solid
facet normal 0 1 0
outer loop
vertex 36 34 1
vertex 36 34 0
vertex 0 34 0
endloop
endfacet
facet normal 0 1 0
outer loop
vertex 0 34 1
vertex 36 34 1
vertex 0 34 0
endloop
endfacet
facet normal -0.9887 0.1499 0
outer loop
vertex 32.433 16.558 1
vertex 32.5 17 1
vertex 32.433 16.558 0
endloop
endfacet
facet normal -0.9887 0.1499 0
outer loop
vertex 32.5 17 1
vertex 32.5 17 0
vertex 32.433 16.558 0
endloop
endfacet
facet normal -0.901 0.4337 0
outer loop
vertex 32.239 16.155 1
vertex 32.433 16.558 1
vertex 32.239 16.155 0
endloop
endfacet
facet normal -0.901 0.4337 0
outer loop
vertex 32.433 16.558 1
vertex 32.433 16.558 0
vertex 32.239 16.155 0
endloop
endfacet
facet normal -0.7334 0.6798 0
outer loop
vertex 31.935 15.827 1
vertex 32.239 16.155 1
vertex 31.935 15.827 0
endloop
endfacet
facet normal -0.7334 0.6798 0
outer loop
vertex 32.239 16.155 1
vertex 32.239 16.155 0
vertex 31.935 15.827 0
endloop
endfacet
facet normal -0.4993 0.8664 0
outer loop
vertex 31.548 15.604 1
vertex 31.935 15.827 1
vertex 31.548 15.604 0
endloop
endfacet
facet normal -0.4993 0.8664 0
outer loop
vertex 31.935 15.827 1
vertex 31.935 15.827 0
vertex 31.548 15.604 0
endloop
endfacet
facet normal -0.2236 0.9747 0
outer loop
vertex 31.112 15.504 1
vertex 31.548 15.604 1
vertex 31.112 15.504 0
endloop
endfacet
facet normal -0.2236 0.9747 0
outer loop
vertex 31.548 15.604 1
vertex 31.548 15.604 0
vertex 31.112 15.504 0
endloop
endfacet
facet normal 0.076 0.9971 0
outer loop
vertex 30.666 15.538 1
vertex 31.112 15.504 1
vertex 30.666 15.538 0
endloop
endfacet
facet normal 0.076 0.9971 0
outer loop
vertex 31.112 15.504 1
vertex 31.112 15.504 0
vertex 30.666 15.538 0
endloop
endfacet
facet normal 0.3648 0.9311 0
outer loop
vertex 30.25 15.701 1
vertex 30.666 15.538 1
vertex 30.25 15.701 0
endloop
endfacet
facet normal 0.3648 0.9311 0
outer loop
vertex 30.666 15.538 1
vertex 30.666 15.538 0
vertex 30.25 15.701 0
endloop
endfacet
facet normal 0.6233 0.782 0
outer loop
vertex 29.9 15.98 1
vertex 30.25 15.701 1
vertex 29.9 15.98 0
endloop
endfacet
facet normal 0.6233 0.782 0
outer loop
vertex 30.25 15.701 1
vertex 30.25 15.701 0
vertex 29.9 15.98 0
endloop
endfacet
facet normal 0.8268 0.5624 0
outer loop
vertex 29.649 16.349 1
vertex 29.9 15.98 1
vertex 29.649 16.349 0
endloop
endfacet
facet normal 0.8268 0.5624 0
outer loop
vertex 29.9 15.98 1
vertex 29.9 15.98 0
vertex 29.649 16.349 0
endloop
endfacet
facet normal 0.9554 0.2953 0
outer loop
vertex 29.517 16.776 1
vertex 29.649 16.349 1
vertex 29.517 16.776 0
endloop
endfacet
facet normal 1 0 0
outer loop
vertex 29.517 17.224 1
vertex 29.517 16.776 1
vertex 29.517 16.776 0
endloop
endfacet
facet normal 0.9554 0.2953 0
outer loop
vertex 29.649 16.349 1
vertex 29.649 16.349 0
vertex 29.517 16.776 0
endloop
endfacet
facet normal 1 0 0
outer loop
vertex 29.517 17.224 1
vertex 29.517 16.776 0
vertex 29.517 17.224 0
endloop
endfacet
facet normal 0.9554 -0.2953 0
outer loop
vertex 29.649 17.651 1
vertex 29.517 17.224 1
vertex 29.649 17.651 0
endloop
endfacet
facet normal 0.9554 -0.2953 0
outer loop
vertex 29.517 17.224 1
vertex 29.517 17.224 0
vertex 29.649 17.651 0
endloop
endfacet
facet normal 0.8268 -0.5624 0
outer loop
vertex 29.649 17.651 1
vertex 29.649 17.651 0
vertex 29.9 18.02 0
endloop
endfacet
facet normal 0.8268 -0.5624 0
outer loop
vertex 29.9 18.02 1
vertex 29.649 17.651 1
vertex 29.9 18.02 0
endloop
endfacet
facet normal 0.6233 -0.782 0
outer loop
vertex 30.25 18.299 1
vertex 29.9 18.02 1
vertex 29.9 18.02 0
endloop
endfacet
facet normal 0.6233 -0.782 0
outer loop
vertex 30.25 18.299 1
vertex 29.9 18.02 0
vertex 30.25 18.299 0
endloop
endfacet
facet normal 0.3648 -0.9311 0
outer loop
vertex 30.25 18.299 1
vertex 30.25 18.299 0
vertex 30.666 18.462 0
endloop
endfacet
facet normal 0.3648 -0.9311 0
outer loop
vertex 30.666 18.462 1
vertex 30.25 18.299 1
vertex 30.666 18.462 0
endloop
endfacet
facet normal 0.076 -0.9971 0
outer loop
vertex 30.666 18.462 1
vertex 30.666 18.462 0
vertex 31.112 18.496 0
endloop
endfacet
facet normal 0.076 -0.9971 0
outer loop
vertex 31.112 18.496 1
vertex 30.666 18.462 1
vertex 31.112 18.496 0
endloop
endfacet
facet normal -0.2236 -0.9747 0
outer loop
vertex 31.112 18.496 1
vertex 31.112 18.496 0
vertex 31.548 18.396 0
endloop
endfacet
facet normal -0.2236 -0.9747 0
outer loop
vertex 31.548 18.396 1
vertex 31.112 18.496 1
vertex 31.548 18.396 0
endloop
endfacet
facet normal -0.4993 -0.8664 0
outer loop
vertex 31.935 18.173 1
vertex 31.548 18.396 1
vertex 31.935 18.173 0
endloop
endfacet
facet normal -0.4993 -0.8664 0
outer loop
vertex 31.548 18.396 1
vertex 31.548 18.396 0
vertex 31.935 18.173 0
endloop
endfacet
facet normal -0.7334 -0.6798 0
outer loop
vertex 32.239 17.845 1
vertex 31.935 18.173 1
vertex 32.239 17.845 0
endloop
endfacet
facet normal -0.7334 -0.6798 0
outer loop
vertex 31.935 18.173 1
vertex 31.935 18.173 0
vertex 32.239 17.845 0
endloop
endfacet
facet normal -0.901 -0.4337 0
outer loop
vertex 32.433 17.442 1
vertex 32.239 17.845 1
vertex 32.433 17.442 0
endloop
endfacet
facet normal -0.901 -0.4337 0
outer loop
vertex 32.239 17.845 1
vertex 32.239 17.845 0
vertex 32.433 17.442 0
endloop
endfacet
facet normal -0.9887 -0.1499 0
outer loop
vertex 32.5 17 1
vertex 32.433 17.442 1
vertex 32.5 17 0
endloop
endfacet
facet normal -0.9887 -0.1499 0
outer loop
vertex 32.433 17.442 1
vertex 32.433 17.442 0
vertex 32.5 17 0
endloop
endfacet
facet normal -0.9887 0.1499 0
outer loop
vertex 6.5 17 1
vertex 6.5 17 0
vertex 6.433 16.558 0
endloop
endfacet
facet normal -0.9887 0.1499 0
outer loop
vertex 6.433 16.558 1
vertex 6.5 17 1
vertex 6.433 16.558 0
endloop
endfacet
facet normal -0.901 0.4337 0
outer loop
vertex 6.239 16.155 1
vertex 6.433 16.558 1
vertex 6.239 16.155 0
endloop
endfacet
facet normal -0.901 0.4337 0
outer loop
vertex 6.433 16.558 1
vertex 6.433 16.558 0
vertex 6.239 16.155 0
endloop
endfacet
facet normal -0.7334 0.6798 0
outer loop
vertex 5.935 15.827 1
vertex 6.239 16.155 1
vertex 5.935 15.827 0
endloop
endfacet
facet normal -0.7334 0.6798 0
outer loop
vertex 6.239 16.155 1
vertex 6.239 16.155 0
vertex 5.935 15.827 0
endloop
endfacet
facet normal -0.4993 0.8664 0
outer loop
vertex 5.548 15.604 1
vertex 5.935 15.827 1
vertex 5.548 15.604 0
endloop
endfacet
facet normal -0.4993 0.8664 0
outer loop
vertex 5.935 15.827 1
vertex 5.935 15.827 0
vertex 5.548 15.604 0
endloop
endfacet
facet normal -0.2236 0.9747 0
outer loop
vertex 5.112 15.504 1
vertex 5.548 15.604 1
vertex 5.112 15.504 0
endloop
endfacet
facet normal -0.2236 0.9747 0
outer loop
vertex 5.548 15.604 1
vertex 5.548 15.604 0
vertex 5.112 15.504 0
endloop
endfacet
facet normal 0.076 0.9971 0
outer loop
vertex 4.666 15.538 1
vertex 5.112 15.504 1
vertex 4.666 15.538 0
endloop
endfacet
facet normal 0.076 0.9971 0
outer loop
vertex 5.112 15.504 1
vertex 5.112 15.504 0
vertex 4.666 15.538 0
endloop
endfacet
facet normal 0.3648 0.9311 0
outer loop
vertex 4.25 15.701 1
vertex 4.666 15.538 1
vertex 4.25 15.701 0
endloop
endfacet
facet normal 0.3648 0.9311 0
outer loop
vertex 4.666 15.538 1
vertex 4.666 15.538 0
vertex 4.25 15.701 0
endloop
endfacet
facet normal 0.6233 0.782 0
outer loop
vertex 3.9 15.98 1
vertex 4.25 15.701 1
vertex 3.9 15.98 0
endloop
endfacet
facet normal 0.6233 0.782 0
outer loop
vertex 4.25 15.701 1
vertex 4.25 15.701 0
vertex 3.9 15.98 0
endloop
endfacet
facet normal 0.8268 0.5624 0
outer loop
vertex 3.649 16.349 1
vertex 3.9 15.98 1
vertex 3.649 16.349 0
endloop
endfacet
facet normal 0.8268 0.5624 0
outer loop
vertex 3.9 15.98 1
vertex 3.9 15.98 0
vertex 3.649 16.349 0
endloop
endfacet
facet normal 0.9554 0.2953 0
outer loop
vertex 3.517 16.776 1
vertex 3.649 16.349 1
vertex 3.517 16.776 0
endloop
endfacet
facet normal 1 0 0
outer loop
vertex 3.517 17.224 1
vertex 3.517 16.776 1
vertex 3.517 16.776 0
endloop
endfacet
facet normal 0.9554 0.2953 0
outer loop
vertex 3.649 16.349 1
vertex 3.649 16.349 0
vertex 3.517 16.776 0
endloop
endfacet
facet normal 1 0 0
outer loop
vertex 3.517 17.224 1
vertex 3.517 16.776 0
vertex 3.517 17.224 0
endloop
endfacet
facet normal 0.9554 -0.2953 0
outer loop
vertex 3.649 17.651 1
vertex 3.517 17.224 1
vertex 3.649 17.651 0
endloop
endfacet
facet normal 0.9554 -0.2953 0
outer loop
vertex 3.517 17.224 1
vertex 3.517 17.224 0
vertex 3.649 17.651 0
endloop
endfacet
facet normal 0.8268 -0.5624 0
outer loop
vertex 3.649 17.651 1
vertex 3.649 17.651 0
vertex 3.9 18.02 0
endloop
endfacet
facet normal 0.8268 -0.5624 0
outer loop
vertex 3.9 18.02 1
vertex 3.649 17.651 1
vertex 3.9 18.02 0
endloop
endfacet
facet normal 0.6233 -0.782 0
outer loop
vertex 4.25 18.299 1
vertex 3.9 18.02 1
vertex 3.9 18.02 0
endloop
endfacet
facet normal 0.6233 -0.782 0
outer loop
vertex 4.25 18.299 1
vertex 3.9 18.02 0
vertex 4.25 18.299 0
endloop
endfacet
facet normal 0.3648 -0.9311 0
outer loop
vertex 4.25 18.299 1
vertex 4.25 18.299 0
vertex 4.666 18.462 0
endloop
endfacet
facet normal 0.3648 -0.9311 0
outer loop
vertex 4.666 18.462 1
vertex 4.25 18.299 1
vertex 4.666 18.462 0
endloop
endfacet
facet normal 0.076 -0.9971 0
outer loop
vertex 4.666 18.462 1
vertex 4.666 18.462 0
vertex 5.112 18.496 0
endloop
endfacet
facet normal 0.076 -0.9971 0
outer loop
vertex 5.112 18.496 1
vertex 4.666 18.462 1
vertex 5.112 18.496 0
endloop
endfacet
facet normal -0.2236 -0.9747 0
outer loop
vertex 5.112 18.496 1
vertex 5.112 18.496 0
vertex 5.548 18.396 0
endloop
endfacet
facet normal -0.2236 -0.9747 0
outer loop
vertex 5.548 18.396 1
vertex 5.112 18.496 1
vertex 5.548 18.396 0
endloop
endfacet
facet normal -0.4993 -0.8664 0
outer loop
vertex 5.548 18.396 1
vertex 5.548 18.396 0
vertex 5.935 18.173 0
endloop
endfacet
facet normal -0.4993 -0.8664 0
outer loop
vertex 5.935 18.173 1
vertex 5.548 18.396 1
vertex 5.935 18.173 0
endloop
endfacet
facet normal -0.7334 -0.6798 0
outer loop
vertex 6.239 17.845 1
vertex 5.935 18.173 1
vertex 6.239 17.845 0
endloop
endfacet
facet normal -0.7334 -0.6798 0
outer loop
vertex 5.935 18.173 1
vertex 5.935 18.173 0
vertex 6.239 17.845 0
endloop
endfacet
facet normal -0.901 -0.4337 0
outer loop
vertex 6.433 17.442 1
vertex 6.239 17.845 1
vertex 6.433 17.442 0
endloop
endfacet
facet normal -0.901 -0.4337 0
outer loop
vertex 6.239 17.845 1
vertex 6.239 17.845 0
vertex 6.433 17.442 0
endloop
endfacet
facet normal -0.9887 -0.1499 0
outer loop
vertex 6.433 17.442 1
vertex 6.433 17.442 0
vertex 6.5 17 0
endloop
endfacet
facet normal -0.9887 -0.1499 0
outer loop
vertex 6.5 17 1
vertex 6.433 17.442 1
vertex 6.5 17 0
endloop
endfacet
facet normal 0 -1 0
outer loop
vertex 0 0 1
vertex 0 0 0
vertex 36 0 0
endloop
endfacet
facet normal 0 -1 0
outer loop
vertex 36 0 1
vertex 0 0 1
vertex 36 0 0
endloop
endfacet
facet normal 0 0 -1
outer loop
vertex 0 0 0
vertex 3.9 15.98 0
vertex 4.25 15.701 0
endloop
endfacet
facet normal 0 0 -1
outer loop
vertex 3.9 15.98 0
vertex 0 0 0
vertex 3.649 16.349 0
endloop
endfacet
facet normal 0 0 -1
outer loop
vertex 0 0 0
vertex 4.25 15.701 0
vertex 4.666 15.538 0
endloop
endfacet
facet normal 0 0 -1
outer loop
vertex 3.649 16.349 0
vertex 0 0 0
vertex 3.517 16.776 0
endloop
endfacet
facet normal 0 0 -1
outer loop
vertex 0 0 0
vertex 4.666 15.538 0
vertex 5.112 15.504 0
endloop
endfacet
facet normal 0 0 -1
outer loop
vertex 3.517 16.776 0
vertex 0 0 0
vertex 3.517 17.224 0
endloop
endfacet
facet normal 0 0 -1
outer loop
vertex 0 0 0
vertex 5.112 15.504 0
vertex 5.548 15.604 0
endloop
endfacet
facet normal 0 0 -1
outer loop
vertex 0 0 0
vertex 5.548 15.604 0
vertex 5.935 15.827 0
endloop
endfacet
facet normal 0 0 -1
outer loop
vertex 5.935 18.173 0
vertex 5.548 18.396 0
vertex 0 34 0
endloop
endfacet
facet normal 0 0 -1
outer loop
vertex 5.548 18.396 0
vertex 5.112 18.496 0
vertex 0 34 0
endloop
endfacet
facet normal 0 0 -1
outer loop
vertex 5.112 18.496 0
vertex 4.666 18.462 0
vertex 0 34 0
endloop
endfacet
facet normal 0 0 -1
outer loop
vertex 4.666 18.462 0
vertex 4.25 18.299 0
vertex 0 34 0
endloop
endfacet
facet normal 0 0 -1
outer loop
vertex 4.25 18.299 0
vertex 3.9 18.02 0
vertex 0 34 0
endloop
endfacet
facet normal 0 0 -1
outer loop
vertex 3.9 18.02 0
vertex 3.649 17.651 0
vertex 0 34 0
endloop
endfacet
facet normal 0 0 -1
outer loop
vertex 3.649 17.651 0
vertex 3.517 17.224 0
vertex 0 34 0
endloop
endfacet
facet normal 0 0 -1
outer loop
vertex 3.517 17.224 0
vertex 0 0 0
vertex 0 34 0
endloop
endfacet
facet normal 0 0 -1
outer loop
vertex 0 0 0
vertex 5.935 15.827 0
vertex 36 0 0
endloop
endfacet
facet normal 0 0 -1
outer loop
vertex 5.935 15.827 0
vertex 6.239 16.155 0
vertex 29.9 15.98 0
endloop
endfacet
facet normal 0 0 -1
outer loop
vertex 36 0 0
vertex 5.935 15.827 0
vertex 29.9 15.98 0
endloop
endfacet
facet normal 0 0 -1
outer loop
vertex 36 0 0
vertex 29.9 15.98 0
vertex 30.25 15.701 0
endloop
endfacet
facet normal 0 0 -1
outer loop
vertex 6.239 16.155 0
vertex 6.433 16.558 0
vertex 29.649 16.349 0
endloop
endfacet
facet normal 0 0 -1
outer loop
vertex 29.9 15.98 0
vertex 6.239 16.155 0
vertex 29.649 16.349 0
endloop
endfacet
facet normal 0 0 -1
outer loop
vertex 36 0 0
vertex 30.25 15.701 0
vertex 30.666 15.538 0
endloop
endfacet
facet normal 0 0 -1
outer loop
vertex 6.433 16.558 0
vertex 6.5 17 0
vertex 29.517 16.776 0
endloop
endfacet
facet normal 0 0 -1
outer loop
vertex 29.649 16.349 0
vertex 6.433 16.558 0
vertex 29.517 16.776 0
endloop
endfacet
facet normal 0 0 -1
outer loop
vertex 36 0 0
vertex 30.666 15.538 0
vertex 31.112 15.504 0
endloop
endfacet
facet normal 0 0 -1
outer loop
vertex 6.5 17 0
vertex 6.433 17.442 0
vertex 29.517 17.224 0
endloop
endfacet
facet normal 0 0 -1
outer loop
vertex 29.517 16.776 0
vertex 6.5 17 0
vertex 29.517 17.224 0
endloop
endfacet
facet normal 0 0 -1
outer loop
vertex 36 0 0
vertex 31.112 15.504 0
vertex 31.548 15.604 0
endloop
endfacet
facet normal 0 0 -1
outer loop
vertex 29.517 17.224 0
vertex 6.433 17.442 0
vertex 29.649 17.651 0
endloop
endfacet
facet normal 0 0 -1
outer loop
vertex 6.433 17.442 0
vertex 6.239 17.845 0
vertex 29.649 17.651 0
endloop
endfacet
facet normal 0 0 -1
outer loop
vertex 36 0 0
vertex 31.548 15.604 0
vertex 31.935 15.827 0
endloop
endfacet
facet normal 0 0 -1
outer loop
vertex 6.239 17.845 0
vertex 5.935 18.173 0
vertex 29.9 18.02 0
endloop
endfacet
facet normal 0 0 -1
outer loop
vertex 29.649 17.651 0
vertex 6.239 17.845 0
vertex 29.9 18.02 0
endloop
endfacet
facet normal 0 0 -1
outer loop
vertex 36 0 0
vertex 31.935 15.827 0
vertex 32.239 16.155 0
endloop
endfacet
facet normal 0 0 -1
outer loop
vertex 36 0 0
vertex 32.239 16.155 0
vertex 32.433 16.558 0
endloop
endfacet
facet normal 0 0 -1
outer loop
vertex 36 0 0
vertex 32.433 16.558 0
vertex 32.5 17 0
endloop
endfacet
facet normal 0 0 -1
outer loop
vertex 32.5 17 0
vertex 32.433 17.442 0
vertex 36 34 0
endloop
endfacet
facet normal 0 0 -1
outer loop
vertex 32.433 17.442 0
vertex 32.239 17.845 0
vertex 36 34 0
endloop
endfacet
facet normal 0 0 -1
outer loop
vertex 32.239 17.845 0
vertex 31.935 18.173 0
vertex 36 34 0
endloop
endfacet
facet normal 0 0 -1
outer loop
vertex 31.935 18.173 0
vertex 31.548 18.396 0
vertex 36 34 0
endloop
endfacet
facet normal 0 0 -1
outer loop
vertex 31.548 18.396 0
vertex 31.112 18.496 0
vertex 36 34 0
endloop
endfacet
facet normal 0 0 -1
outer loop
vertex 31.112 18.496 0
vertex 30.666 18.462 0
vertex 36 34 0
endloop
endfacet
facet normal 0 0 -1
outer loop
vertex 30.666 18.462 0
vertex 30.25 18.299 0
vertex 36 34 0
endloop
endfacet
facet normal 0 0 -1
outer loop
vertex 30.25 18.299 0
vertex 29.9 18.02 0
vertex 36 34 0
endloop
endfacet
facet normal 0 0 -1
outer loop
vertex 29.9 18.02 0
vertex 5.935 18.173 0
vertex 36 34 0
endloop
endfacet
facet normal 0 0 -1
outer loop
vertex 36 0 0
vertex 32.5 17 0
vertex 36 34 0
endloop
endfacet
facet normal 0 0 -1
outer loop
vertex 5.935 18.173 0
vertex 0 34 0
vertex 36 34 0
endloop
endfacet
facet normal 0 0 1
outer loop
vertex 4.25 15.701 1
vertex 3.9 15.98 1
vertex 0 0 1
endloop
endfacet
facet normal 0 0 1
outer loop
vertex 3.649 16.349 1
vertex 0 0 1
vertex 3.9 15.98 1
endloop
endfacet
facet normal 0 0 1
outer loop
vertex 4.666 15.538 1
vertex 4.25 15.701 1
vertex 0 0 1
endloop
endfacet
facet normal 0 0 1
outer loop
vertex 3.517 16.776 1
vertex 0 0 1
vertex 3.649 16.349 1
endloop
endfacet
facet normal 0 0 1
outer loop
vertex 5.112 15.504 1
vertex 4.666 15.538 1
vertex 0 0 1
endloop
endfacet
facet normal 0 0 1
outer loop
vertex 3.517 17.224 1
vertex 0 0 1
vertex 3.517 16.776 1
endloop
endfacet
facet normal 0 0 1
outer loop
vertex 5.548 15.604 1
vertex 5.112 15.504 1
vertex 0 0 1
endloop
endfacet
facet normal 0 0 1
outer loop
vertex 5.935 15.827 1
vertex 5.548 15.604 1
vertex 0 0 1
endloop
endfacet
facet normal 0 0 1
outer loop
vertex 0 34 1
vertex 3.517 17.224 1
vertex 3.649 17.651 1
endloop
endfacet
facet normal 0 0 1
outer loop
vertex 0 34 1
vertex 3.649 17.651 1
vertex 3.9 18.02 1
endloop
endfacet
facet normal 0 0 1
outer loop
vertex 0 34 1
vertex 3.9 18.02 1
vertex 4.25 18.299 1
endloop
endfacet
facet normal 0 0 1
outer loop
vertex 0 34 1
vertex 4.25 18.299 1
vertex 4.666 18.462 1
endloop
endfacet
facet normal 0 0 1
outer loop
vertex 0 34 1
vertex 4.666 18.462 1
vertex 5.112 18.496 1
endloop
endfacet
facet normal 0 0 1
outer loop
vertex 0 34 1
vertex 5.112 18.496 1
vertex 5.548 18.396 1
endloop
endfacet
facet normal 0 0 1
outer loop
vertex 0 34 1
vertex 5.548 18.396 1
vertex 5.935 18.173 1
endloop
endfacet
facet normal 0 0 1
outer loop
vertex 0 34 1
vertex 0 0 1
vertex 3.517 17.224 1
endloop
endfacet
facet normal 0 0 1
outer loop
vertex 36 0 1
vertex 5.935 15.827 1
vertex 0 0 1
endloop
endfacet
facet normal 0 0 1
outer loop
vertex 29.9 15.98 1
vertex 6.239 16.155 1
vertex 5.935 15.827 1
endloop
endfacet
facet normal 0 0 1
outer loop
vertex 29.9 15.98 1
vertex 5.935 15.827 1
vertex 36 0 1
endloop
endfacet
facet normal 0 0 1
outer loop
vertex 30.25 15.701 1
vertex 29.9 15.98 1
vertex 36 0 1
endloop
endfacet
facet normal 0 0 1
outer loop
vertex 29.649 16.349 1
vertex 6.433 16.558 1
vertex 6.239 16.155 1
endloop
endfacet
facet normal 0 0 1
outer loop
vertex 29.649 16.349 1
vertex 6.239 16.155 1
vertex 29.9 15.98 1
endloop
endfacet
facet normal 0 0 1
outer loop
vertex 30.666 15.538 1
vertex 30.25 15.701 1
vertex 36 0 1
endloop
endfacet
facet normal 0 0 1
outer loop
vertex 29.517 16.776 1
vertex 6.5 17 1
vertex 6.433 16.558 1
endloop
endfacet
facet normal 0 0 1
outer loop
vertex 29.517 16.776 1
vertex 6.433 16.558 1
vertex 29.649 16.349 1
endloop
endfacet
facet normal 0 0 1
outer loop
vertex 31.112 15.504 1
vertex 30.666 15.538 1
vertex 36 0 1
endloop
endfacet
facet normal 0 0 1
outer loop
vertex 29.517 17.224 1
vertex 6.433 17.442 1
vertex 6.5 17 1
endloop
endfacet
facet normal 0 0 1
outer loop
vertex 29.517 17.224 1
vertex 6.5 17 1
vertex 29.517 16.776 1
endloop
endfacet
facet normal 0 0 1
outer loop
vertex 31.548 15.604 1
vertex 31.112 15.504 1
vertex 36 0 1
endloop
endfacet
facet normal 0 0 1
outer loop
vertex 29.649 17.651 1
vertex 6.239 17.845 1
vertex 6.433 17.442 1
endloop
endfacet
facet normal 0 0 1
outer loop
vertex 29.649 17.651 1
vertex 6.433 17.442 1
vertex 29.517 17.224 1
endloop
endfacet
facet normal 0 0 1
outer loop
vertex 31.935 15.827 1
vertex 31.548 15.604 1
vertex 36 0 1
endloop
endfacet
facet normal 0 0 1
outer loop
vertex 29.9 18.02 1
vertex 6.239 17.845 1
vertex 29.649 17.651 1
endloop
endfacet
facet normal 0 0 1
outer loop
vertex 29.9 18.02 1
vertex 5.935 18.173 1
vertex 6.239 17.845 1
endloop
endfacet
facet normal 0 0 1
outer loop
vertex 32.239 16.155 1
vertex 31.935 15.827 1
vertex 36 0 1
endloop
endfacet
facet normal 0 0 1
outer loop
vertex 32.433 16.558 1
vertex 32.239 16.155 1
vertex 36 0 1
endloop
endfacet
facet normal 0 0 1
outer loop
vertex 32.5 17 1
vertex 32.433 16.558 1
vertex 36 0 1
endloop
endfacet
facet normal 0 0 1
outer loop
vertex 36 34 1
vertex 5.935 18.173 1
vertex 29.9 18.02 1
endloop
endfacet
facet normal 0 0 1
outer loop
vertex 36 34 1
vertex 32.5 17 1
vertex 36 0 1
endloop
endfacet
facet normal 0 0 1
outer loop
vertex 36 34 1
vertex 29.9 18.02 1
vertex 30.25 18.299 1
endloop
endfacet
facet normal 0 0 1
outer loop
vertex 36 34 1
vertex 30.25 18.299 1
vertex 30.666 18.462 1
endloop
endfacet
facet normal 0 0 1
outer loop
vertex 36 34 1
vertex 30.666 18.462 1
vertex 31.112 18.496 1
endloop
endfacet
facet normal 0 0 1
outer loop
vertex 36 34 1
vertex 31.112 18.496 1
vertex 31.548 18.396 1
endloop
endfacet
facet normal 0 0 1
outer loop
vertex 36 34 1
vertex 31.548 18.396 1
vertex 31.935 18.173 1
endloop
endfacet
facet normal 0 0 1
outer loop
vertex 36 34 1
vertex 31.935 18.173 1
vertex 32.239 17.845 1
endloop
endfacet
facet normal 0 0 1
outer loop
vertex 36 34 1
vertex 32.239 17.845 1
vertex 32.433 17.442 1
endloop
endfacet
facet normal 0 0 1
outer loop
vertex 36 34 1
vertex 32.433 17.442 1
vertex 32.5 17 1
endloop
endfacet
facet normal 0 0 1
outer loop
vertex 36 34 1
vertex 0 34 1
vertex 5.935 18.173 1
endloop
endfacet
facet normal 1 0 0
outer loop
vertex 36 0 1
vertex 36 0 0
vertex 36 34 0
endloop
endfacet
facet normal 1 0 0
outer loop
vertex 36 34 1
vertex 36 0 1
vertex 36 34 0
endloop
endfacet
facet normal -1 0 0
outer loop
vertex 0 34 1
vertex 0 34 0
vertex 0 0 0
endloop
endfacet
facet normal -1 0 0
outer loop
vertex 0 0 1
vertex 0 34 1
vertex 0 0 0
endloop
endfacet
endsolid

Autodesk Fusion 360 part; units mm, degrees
sketch "スケッチ1" plane through (0, 0, 0) normal (0, 0, 1) x (1, 0, 0)
  line L0 (0, 0) -> (36, 0)
  line L1 (36, 0) -> (36, 34)
  line L2 (36, 34) -> (0, 34)
  line L3 (0, 34) -> (0, 0)
  line L4 (0, 34) -> (0, 17)
  line L5 (0, 17) -> (5, 17)
  circle A0 centre (5, 17) radius 1.5
  line L6 (5, 17) -> (31, 17)
  circle A1 centre (31, 17) radius 1.5
  line L7 (31, 17) -> (36, 17)
  dimension "d1" = 36
  dimension "d2" = 34
  dimension "d3" = 3
  dimension "d4" = 26
  dimension "d5" = 3
extrude "押し出し1" add sketch "スケッチ1" along normal blind 1 contours L0 L1 L3 L5 A0 L6 A1 L7 | L1 L2 L3 L4 L5 A0 L6 A1 L7
